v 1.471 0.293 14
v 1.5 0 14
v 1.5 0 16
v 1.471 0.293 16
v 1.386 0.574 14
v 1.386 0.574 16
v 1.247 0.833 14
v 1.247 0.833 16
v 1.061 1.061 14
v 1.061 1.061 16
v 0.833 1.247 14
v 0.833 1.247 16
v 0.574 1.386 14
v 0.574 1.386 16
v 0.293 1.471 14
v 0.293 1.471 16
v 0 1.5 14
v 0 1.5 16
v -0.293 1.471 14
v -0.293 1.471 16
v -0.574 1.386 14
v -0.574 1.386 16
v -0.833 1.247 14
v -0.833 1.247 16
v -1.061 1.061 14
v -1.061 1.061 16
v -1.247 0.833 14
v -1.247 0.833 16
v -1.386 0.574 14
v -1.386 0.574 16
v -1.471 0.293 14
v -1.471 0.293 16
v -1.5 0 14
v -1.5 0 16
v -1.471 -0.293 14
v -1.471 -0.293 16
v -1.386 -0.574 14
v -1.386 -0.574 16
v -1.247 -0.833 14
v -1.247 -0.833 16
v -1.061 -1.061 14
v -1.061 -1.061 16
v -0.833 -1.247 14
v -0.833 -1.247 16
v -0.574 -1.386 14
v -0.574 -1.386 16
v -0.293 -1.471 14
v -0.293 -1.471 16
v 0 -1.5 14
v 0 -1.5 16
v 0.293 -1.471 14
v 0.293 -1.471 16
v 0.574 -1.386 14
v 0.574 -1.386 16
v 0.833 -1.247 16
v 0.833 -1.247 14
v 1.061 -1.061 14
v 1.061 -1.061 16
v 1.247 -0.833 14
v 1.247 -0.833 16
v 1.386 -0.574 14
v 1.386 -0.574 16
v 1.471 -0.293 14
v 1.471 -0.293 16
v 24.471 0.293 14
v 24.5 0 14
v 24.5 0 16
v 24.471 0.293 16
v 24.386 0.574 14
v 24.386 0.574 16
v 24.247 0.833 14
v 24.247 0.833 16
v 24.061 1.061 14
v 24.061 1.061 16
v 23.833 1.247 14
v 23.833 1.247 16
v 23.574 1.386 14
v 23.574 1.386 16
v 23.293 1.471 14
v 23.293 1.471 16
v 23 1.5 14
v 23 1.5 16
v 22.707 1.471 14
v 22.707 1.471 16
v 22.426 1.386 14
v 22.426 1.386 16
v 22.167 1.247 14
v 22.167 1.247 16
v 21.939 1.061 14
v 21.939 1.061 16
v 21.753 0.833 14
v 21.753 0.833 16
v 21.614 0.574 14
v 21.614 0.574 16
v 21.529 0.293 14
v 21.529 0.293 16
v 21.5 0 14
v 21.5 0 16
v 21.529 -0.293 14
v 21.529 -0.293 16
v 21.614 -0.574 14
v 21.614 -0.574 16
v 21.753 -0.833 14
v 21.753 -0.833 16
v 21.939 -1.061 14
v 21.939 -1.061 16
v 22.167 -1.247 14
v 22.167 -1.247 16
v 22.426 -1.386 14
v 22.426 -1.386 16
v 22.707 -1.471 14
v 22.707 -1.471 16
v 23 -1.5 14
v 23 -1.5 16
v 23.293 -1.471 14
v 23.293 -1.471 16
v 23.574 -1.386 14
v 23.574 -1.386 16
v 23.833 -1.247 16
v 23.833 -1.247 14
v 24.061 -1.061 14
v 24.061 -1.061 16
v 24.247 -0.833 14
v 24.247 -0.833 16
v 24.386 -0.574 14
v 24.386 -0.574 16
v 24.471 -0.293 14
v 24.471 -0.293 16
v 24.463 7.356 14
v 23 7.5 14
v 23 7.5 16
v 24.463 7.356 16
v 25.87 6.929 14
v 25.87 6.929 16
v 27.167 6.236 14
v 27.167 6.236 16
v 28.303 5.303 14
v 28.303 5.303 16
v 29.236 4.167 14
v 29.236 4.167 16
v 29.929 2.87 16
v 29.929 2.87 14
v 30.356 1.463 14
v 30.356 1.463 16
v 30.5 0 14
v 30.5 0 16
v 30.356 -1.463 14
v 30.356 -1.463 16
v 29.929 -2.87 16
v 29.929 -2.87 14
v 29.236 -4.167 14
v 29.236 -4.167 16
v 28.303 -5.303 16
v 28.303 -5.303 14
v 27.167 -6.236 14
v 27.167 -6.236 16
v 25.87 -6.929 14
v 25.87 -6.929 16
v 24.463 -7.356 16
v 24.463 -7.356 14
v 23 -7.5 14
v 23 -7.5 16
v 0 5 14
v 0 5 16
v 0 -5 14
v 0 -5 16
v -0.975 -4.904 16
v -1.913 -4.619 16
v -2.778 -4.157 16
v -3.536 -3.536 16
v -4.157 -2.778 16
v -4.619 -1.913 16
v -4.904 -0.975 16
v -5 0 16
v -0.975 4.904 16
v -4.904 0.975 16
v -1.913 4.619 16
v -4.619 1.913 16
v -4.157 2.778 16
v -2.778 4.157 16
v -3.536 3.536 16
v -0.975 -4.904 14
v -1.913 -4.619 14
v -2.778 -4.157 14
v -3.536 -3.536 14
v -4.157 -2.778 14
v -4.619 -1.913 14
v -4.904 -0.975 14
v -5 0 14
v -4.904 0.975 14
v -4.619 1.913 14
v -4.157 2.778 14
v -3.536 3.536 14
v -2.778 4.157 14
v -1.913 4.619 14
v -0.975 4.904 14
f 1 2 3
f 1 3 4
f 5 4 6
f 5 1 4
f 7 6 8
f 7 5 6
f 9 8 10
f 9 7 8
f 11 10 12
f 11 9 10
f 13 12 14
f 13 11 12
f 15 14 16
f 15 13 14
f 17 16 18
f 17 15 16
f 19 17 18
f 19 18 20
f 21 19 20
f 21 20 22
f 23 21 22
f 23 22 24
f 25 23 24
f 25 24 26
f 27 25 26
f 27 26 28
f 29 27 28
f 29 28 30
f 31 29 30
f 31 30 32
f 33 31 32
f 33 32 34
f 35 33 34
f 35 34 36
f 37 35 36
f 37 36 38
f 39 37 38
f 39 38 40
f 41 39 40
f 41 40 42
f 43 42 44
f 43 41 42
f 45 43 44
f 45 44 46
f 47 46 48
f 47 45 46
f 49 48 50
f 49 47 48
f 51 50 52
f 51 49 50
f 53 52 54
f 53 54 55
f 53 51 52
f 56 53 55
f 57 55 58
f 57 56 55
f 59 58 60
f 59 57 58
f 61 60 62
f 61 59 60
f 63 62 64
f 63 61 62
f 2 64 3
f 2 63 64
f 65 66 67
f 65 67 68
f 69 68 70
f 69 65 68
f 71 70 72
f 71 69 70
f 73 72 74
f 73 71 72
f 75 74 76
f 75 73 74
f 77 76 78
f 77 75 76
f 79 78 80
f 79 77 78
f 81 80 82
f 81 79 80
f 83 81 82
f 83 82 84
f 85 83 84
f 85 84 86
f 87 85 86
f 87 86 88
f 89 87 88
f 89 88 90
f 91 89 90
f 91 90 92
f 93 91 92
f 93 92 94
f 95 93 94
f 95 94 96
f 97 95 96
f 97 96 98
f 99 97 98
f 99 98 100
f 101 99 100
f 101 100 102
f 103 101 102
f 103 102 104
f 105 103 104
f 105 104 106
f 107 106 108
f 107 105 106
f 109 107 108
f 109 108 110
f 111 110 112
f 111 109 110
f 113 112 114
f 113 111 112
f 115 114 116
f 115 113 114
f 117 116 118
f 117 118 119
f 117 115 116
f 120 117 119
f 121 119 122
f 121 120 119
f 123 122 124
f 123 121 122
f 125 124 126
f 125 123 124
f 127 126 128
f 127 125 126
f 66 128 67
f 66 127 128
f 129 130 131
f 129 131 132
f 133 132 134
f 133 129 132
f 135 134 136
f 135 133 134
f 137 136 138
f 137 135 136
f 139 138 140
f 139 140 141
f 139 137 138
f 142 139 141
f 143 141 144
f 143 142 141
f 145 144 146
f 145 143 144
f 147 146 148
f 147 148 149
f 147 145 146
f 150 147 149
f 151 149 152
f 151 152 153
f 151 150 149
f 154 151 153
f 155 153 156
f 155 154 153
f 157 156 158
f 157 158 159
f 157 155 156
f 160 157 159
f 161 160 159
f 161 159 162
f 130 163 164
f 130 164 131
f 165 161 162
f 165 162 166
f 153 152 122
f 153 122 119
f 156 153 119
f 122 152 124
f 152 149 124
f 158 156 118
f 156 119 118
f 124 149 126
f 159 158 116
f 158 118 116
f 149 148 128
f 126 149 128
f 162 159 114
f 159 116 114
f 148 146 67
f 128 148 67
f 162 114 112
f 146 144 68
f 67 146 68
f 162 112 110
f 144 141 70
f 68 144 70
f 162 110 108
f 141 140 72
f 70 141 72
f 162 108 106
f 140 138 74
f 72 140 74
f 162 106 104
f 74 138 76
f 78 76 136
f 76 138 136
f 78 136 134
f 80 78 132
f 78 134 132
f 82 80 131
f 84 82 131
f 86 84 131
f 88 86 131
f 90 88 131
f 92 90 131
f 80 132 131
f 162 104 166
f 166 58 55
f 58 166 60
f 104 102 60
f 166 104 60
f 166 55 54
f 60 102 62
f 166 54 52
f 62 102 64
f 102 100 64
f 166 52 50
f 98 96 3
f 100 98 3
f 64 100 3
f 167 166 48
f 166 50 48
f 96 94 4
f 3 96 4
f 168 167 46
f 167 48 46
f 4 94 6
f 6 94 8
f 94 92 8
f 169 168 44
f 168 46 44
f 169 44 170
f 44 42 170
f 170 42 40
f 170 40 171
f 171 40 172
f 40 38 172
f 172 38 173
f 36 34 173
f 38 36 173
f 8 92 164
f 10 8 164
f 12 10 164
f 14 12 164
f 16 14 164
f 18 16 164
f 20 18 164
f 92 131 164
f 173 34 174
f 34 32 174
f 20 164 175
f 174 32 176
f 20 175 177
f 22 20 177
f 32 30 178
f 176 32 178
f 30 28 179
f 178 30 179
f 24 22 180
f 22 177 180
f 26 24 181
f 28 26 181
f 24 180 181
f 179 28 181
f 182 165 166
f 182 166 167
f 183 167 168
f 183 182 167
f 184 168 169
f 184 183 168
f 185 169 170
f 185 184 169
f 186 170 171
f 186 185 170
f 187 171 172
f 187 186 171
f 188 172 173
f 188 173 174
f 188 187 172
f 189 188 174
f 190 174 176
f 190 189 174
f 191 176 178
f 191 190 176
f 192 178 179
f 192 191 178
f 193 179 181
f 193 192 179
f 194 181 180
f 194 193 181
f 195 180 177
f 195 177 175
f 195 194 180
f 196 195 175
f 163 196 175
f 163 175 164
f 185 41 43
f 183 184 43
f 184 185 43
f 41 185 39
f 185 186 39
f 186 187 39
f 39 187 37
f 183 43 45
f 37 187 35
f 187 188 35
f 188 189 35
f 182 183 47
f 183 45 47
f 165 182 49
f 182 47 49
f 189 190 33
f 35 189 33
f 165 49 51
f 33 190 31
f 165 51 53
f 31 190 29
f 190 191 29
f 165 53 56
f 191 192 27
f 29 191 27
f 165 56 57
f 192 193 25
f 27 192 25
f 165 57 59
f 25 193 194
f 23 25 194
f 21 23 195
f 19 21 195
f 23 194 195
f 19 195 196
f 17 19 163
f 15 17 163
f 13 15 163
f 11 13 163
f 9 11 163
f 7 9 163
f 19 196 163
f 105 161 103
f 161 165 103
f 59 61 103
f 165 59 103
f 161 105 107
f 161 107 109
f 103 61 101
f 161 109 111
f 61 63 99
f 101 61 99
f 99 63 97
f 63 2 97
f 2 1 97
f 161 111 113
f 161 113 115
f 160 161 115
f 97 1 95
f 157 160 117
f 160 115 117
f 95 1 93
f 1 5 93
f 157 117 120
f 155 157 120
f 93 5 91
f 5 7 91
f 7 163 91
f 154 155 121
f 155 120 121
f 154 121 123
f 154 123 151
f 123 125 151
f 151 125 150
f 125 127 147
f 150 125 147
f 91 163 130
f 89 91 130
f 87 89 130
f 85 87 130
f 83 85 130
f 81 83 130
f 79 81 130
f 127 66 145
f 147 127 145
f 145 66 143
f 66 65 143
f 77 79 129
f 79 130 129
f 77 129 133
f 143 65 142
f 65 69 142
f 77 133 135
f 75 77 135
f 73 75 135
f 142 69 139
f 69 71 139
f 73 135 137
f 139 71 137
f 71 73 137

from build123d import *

# Parameters (mm, degrees)
SKETCH1_R           = 1.5
BOSS_EXTRUDE1_DEPTH = 16
SKETCH3_W           = 48.560524615
SKETCH3_H           = 12
CUT_EXTRUDE1_DEPTH  = 38.566607513
SKETCH4_W           = 40.711523195
SKETCH4_H           = 24.869533466
CUT_EXTRUDE2_DEPTH  = 10


with BuildPart() as part:
    # Sketch1 → Boss-Extrude1 (new body)
    with BuildSketch(Plane.XY):
        with BuildLine():
            ThreePointArc((23, 7.5), (30.5, 0), (23, -7.5))
            Line((23, -7.5), (0, -5))
            ThreePointArc((0, -5), (-5, 0), (0, 5))
            Line((0, 5), (23, 7.5))
        make_face()
        with Locations((23, 0)):
            Circle(SKETCH1_R, mode=Mode.SUBTRACT)
        Circle(SKETCH1_R, mode=Mode.SUBTRACT)
    extrude(amount=BOSS_EXTRUDE1_DEPTH)

    # Sketch3 → Cut-Extrude1 (cut, through all)
    with BuildSketch(Plane(origin=(0, 7.5, 0), x_dir=(1, 0, 0), z_dir=(0, 1, 0))):
        with Locations((17.305581285, -8)):
            Rectangle(SKETCH3_W, SKETCH3_H)
    extrude(amount=-CUT_EXTRUDE1_DEPTH, mode=Mode.SUBTRACT)


with BuildPart() as cut_extrude1_piece_1:
    # of the separate pieces the step leaves, piece 1, a body of its own (cut_extrude1_pieces)
    add(part.part.solids().sort_by_distance((0, 5, 0))[0])

    # Sketch4 → Cut-Extrude2 (cut)
    with BuildSketch(Plane(origin=(0, 0, 0), x_dir=(-1, 0, 0), z_dir=(0, 0, -1))):
        with Locations((-12.191435823, 3.299568453)):
            Rectangle(SKETCH4_W, SKETCH4_H)
    extrude(amount=-CUT_EXTRUDE2_DEPTH, mode=Mode.SUBTRACT)


with BuildPart() as cut_extrude1_piece_2:
    # of the separate pieces the step leaves, piece 2, a body of its own (cut_extrude1_pieces)
    add(part.part.solids().sort_by_distance((0, 5, 14))[0])


solid = cut_extrude1_piece_2.part
